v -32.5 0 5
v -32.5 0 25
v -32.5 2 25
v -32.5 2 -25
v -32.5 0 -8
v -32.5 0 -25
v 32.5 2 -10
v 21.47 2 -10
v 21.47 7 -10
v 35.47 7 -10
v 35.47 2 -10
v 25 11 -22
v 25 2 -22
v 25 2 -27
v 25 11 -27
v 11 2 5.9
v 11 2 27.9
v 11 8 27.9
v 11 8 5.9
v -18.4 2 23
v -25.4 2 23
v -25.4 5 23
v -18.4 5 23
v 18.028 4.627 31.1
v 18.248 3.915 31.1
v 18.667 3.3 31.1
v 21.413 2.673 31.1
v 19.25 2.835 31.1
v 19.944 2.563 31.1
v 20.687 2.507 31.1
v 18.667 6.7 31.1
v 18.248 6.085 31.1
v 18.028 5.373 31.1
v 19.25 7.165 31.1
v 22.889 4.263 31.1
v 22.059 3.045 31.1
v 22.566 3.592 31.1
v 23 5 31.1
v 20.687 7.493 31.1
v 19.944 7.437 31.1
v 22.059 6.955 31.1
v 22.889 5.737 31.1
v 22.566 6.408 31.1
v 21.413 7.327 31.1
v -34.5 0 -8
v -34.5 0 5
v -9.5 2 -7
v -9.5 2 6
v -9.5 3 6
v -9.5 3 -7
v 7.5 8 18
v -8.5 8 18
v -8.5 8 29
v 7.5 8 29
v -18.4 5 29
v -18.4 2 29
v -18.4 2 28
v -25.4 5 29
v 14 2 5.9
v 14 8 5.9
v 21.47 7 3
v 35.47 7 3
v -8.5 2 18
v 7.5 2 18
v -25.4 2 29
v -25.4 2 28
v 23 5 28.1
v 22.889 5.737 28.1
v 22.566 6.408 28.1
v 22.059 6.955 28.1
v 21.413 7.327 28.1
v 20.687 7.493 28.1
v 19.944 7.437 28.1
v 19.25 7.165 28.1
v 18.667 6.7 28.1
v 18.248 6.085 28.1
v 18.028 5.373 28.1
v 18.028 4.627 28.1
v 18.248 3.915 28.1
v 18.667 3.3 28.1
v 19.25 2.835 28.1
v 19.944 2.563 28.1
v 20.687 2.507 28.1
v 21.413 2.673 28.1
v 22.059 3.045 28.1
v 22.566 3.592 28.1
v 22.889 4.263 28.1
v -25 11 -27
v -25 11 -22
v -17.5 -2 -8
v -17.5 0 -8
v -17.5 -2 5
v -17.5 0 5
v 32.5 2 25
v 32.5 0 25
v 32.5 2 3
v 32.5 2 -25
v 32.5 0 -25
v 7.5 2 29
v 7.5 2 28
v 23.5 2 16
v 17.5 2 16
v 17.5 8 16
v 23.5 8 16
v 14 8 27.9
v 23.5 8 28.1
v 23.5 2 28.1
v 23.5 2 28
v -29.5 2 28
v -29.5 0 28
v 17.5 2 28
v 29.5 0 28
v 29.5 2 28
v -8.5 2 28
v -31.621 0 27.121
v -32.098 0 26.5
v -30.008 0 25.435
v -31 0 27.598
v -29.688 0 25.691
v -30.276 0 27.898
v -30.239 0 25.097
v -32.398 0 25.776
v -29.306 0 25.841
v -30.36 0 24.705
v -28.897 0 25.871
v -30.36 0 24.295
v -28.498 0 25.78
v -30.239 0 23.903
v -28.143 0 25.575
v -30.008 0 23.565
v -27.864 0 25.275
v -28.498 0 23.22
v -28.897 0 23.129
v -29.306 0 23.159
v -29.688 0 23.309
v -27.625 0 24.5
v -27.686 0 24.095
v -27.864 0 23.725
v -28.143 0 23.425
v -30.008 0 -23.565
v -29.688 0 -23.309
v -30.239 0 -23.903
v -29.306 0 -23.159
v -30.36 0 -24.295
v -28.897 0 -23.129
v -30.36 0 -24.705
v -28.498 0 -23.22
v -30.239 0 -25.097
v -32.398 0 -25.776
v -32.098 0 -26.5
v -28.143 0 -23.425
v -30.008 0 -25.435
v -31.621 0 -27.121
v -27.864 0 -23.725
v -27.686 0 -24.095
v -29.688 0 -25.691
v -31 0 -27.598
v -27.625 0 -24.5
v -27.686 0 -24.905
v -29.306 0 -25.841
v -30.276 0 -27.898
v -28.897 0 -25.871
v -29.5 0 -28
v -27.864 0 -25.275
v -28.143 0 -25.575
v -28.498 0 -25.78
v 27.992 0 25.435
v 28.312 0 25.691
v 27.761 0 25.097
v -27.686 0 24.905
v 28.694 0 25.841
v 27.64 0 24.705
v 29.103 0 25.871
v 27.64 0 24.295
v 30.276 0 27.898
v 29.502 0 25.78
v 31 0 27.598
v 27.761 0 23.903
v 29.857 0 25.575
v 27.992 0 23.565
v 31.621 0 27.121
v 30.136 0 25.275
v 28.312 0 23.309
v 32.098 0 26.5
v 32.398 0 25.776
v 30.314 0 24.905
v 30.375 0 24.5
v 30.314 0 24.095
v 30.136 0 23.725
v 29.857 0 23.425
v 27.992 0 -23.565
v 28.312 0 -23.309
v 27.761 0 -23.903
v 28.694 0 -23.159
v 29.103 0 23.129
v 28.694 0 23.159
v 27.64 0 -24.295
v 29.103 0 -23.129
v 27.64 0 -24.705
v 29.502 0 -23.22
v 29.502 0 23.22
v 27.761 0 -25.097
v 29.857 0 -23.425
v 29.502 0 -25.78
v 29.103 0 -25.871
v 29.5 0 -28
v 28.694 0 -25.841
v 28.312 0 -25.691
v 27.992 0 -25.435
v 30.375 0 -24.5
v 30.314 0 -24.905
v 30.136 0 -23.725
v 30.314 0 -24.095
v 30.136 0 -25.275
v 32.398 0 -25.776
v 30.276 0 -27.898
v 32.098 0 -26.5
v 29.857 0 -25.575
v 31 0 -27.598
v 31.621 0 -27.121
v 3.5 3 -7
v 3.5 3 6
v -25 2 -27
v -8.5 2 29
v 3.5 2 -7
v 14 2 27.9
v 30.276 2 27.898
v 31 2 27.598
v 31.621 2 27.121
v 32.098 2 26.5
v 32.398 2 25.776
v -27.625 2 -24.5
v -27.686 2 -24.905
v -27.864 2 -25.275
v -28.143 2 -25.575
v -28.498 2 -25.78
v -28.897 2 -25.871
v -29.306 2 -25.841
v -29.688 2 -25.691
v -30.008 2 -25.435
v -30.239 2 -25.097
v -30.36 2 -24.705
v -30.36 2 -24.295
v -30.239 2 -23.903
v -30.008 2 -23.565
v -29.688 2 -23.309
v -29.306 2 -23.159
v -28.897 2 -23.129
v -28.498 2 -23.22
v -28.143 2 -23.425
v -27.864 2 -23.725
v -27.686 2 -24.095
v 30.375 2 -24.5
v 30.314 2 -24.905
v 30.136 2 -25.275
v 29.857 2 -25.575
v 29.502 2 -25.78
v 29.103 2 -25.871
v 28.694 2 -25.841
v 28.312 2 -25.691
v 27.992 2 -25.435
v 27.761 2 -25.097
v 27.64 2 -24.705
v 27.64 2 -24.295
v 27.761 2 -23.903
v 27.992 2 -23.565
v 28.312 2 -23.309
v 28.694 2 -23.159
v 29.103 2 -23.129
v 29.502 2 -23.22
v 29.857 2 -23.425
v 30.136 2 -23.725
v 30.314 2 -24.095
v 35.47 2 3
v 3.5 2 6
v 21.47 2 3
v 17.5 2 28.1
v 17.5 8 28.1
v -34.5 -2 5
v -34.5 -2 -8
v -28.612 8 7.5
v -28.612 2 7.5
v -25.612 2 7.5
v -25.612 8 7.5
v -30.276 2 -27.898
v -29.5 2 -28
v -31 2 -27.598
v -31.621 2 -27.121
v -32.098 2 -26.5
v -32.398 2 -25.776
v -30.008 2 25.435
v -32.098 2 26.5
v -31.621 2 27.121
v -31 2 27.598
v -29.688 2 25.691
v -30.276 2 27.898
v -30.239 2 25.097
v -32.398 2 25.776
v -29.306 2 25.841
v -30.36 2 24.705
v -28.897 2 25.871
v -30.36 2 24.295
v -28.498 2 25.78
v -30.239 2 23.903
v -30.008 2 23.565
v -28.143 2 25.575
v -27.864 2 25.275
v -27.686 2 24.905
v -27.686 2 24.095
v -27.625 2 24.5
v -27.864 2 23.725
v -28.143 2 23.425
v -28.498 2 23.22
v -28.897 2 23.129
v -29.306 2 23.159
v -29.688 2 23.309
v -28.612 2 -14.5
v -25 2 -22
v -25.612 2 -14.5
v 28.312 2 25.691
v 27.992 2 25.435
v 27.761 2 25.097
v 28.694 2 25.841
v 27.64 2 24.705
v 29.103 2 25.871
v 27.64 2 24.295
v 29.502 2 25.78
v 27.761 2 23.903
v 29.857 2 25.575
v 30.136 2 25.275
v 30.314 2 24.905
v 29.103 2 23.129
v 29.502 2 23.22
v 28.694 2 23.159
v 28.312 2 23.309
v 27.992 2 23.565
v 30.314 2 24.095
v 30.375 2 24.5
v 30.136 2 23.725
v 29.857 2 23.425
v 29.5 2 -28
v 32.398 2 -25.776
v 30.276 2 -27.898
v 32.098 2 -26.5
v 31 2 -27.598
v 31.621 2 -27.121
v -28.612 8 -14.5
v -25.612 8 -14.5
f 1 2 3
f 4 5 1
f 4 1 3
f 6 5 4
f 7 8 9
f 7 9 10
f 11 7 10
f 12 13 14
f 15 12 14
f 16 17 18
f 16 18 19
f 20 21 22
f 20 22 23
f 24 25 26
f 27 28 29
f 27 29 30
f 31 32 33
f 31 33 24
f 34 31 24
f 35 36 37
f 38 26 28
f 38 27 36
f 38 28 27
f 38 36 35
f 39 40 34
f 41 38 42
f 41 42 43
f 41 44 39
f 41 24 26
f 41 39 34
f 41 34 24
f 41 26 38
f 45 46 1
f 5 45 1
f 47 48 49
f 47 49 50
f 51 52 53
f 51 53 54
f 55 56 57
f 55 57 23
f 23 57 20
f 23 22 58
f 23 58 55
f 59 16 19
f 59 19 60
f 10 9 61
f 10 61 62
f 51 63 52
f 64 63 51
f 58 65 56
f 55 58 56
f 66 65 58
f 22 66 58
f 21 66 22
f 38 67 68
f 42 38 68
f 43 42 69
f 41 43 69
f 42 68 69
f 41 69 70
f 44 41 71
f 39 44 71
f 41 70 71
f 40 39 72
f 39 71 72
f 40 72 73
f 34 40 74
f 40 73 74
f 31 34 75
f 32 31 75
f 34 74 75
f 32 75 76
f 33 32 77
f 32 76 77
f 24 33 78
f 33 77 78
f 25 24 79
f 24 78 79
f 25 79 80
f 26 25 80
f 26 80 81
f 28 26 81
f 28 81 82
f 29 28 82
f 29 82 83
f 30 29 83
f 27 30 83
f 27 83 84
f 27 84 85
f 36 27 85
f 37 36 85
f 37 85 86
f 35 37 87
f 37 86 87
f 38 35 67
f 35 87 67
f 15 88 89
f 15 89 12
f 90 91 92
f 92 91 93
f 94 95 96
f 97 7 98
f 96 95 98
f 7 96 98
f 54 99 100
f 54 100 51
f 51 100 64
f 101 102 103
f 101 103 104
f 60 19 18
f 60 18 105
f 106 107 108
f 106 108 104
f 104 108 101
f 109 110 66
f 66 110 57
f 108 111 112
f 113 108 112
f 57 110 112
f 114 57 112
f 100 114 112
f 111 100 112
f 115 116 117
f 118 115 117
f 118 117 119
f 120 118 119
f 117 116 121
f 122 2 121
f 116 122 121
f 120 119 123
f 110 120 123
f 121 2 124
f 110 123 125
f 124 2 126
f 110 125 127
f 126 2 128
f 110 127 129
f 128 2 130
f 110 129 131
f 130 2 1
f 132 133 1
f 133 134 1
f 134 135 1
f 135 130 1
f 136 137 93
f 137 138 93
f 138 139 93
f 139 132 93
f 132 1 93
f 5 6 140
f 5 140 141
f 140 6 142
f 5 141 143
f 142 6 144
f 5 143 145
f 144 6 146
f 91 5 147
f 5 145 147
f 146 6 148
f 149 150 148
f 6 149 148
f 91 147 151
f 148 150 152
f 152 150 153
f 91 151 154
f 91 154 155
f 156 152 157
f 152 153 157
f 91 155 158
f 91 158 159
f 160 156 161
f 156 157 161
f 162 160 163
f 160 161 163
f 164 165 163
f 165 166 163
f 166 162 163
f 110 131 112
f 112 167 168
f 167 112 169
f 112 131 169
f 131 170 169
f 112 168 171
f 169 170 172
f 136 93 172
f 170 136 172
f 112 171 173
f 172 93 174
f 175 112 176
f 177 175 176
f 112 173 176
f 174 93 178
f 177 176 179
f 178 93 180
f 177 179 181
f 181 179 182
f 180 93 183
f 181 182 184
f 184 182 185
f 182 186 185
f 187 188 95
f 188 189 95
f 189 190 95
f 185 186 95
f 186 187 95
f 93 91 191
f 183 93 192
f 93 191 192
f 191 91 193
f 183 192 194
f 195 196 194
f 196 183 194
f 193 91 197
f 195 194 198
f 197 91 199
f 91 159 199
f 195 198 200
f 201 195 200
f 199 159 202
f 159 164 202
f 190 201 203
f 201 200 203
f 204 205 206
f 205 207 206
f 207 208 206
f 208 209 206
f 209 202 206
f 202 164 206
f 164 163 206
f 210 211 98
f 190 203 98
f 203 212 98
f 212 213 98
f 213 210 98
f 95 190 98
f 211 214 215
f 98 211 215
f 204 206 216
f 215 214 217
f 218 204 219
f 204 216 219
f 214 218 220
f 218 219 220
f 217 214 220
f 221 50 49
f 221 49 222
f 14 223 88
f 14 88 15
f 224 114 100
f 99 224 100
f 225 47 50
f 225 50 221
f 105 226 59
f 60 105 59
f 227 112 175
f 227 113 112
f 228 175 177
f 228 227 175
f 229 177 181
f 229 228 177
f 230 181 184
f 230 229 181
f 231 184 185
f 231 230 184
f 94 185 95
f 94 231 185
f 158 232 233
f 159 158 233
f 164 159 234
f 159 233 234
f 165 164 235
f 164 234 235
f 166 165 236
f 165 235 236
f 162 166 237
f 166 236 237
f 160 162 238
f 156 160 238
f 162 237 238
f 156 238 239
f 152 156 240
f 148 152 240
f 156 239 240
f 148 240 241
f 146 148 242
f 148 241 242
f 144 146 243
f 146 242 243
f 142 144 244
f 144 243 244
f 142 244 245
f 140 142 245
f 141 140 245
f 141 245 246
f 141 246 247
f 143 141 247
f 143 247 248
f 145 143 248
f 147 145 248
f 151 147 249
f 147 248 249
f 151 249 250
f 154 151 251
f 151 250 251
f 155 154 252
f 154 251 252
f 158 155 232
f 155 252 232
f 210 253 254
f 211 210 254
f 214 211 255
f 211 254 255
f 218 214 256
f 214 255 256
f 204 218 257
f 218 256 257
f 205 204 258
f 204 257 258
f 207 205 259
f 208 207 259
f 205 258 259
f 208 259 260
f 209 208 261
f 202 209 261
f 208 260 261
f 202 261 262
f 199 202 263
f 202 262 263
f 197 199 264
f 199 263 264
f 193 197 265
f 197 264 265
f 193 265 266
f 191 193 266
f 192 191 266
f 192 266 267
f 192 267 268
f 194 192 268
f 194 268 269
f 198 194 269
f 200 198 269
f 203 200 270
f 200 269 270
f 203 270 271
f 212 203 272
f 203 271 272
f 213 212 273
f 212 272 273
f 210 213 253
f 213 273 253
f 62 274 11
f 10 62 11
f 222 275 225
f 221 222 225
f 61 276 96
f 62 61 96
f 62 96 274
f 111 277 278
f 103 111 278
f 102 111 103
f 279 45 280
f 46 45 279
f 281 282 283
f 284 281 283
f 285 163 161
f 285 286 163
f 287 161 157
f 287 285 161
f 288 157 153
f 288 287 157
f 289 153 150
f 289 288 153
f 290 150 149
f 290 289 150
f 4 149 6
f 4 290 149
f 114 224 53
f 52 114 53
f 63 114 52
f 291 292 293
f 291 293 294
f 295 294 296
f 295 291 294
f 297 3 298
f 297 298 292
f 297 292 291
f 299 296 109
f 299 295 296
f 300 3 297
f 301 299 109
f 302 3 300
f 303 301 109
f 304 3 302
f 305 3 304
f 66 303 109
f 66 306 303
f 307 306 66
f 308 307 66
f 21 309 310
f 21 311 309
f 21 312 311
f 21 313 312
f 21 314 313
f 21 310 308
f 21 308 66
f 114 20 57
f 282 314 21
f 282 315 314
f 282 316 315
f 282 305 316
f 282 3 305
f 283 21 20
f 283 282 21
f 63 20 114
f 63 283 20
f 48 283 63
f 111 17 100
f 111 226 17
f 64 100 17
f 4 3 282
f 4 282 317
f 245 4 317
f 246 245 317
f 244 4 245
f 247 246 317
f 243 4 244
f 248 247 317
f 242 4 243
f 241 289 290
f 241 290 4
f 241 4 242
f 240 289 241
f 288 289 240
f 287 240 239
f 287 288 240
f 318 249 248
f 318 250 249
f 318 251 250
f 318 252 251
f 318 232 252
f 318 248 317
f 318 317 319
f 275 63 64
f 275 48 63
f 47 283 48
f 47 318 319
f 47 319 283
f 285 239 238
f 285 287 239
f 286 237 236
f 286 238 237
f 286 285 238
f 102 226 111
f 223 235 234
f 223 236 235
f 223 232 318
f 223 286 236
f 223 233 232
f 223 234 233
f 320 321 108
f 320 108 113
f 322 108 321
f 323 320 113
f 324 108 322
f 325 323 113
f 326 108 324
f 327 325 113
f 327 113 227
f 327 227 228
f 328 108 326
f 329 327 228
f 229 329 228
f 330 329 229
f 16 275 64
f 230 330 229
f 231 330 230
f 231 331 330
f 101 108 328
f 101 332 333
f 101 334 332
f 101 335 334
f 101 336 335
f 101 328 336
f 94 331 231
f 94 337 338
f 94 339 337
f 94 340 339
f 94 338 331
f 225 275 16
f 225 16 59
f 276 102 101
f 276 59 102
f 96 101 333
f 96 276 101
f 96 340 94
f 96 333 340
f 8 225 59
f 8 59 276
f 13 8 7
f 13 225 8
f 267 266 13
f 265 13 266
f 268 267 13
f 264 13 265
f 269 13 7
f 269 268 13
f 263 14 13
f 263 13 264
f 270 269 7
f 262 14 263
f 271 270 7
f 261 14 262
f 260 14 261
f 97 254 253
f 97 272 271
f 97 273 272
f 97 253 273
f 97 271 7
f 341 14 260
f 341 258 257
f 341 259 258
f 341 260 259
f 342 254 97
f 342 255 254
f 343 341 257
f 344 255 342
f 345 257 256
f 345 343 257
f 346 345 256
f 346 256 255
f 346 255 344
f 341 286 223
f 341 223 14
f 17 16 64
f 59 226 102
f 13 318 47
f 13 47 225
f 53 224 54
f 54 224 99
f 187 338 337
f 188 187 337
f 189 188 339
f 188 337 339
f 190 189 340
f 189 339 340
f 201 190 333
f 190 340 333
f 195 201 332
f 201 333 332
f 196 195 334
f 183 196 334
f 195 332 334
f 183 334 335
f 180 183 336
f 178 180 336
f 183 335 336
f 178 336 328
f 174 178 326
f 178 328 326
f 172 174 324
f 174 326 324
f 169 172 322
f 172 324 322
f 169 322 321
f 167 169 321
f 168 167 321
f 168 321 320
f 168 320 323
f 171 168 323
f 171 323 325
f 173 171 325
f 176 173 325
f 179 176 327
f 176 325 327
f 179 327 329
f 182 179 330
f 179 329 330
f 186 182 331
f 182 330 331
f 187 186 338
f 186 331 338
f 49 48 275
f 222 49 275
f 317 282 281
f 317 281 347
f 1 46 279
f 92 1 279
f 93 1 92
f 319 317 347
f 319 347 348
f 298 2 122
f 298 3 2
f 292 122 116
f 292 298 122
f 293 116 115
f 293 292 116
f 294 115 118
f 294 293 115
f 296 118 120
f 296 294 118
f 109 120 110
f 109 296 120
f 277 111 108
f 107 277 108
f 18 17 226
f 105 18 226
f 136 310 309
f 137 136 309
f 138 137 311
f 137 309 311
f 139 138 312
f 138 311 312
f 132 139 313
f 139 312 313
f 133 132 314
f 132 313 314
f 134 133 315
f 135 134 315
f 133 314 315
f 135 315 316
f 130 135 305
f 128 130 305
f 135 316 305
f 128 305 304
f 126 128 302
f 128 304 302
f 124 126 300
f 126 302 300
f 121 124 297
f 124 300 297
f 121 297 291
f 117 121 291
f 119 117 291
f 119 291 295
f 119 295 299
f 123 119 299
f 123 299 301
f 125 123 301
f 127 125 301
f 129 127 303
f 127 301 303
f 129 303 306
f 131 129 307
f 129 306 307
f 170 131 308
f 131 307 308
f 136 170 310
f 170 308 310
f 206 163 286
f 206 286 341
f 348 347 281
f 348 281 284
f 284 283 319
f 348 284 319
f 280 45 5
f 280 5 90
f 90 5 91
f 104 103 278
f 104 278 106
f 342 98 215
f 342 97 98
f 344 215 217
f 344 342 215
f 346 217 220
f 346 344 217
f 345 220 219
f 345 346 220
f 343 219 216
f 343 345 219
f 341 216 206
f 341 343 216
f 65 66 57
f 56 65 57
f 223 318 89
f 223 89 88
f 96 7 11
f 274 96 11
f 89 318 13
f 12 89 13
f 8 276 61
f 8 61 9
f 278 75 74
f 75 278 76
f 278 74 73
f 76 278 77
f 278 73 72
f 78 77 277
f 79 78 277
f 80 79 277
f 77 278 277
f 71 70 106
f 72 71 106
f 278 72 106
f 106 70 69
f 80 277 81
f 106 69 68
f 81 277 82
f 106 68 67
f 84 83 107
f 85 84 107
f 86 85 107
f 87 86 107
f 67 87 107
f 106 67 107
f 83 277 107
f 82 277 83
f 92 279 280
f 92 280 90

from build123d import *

# Parameters (mm, degrees)
SKETCH1_W            = 65
SKETCH1_H            = 56
BOSS_EXTRUDE1_DEPTH  = 2
SKETCH2_R            = 1.375
CUT_EXTRUDE1_DEPTH   = 2
FILLET1_R            = 3
FILLET2_R            = 3
FILLET3_R            = 3
FILLET4_R            = 3
SKETCH3_W            = 50
SKETCH3_H            = 5
BOSS_EXTRUDE2_DEPTH  = 9
SKETCH4_W            = 3
SKETCH4_H            = 22
BOSS_EXTRUDE3_DEPTH  = 6
SKETCH5_W            = 14
SKETCH5_H            = 13
BOSS_EXTRUDE4_DEPTH  = 5
SKETCH6_W            = 6
SKETCH6_H            = 12.1
BOSS_EXTRUDE5_DEPTH  = 6
SKETCH7_R            = 2.5
BOSS_EXTRUDE6_DEPTH  = 3
SKETCH8_W            = 3
SKETCH8_H            = 22
BOSS_EXTRUDE7_DEPTH  = 6
SKETCH9_W            = 16
SKETCH9_H            = 11
BOSS_EXTRUDE8_DEPTH  = 6
SKETCH10_W           = 7
SKETCH10_H           = 6
BOSS_EXTRUDE9_DEPTH  = 3
SKETCH11_W           = 17
SKETCH11_H           = 13
BOSS_EXTRUDE10_DEPTH = 2
SKETCH12_W           = 13
SKETCH12_H           = 13
BOSS_EXTRUDE11_DEPTH = 1


with BuildPart() as part:
    # Sketch1 → Boss-Extrude1 (new body)
    with BuildSketch(Plane(origin=(0, 0, 0), x_dir=(1, 0, 0), z_dir=(0, 1, 0))):
        Rectangle(SKETCH1_W, SKETCH1_H)
    extrude(amount=BOSS_EXTRUDE1_DEPTH)

    # Sketch2 → Cut-Extrude1 (cut)
    with BuildSketch(Plane(origin=(0, 2, 0), x_dir=(1, 0, 0), z_dir=(0, 1, 0))):
        with Locations((-29, -24.5)):
            Circle(SKETCH2_R)
        with Locations((-29, 24.5)):
            Circle(SKETCH2_R)
        with Locations((29, -24.5)):
            Circle(SKETCH2_R)
        with Locations((29, 24.5)):
            Circle(SKETCH2_R)
    extrude(amount=-CUT_EXTRUDE1_DEPTH, mode=Mode.SUBTRACT)

    # Fillet1
    fillet1_edges = [part.edges().sort_by_distance(p)[0] for p in [
        (-32.5, 1, 28),
    ]]
    fillet(fillet1_edges, radius=FILLET1_R)

    # Fillet2
    fillet2_edges = [part.edges().sort_by_distance(p)[0] for p in [
        (32.5, 1, 28),
    ]]
    fillet(fillet2_edges, radius=FILLET2_R)

    # Fillet3
    fillet3_edges = [part.edges().sort_by_distance(p)[0] for p in [
        (32.5, 1, -28),
    ]]
    fillet(fillet3_edges, radius=FILLET3_R)

    # Fillet4
    fillet4_edges = [part.edges().sort_by_distance(p)[0] for p in [
        (-32.5, 1, -28),
    ]]
    fillet(fillet4_edges, radius=FILLET4_R)

    # Sketch3 → Boss-Extrude2 (add)
    with BuildSketch(Plane(origin=(0, 2, 0), x_dir=(1, 0, 0), z_dir=(0, 1, 0))):
        with Locations((0, 24.5)):
            Rectangle(SKETCH3_W, SKETCH3_H)
    extrude(amount=BOSS_EXTRUDE2_DEPTH)

    # Sketch4 → Boss-Extrude3 (add)
    with BuildSketch(Plane(origin=(0, 2, 0), x_dir=(1, 0, 0), z_dir=(0, 1, 0))):
        with Locations((-27.111657831, 3.5)):
            Rectangle(SKETCH4_W, SKETCH4_H)
    extrude(amount=BOSS_EXTRUDE3_DEPTH)

    # Sketch5 → Boss-Extrude4 (add)
    with BuildSketch(Plane(origin=(0, 2, 0), x_dir=(1, 0, 0), z_dir=(0, 1, 0))):
        with Locations((28.469915967, 3.5)):
            Rectangle(SKETCH5_W, SKETCH5_H)
    extrude(amount=BOSS_EXTRUDE4_DEPTH)

    # Sketch6 → Boss-Extrude5 (add)
    with BuildSketch(Plane(origin=(0, 2, 0), x_dir=(1, 0, 0), z_dir=(0, 1, 0))):
        with Locations((20.5, -22.05)):
            Rectangle(SKETCH6_W, SKETCH6_H)
    extrude(amount=BOSS_EXTRUDE5_DEPTH)

    # Sketch7 → Boss-Extrude6 (add)
    with BuildSketch(Plane.XY.offset(28.1)):
        with Locations((20.5, 5)):
            Circle(SKETCH7_R)
    extrude(amount=BOSS_EXTRUDE6_DEPTH)

    # Sketch8 → Boss-Extrude7 (add)
    with BuildSketch(Plane(origin=(0, 2, 0), x_dir=(1, 0, 0), z_dir=(0, 1, 0))):
        with Locations((12.5, -16.9)):
            Rectangle(SKETCH8_W, SKETCH8_H)
    extrude(amount=BOSS_EXTRUDE7_DEPTH)

    # Sketch9 → Boss-Extrude8 (add)
    with BuildSketch(Plane(origin=(0, 2, 0), x_dir=(1, 0, 0), z_dir=(0, 1, 0))):
        with Locations((-0.5, -23.5)):
            Rectangle(SKETCH9_W, SKETCH9_H)
    extrude(amount=BOSS_EXTRUDE8_DEPTH)

    # Sketch10 → Boss-Extrude9 (add)
    with BuildSketch(Plane(origin=(0, 2, 0), x_dir=(1, 0, 0), z_dir=(0, 1, 0))):
        with Locations((-21.9, -26)):
            Rectangle(SKETCH10_W, SKETCH10_H)
    extrude(amount=BOSS_EXTRUDE9_DEPTH)

    # Sketch11 → Boss-Extrude10 (add)
    with BuildSketch(Plane.XZ):
        with Locations((-26, -1.5)):
            Rectangle(SKETCH11_W, SKETCH11_H)
    extrude(amount=BOSS_EXTRUDE10_DEPTH)

    # Sketch12 → Boss-Extrude11 (add)
    with BuildSketch(Plane(origin=(0, 2, 0), x_dir=(1, 0, 0), z_dir=(0, 1, 0))):
        with Locations((-3, 0.5)):
            Rectangle(SKETCH12_W, SKETCH12_H)
    extrude(amount=BOSS_EXTRUDE11_DEPTH)


solid = part.part
